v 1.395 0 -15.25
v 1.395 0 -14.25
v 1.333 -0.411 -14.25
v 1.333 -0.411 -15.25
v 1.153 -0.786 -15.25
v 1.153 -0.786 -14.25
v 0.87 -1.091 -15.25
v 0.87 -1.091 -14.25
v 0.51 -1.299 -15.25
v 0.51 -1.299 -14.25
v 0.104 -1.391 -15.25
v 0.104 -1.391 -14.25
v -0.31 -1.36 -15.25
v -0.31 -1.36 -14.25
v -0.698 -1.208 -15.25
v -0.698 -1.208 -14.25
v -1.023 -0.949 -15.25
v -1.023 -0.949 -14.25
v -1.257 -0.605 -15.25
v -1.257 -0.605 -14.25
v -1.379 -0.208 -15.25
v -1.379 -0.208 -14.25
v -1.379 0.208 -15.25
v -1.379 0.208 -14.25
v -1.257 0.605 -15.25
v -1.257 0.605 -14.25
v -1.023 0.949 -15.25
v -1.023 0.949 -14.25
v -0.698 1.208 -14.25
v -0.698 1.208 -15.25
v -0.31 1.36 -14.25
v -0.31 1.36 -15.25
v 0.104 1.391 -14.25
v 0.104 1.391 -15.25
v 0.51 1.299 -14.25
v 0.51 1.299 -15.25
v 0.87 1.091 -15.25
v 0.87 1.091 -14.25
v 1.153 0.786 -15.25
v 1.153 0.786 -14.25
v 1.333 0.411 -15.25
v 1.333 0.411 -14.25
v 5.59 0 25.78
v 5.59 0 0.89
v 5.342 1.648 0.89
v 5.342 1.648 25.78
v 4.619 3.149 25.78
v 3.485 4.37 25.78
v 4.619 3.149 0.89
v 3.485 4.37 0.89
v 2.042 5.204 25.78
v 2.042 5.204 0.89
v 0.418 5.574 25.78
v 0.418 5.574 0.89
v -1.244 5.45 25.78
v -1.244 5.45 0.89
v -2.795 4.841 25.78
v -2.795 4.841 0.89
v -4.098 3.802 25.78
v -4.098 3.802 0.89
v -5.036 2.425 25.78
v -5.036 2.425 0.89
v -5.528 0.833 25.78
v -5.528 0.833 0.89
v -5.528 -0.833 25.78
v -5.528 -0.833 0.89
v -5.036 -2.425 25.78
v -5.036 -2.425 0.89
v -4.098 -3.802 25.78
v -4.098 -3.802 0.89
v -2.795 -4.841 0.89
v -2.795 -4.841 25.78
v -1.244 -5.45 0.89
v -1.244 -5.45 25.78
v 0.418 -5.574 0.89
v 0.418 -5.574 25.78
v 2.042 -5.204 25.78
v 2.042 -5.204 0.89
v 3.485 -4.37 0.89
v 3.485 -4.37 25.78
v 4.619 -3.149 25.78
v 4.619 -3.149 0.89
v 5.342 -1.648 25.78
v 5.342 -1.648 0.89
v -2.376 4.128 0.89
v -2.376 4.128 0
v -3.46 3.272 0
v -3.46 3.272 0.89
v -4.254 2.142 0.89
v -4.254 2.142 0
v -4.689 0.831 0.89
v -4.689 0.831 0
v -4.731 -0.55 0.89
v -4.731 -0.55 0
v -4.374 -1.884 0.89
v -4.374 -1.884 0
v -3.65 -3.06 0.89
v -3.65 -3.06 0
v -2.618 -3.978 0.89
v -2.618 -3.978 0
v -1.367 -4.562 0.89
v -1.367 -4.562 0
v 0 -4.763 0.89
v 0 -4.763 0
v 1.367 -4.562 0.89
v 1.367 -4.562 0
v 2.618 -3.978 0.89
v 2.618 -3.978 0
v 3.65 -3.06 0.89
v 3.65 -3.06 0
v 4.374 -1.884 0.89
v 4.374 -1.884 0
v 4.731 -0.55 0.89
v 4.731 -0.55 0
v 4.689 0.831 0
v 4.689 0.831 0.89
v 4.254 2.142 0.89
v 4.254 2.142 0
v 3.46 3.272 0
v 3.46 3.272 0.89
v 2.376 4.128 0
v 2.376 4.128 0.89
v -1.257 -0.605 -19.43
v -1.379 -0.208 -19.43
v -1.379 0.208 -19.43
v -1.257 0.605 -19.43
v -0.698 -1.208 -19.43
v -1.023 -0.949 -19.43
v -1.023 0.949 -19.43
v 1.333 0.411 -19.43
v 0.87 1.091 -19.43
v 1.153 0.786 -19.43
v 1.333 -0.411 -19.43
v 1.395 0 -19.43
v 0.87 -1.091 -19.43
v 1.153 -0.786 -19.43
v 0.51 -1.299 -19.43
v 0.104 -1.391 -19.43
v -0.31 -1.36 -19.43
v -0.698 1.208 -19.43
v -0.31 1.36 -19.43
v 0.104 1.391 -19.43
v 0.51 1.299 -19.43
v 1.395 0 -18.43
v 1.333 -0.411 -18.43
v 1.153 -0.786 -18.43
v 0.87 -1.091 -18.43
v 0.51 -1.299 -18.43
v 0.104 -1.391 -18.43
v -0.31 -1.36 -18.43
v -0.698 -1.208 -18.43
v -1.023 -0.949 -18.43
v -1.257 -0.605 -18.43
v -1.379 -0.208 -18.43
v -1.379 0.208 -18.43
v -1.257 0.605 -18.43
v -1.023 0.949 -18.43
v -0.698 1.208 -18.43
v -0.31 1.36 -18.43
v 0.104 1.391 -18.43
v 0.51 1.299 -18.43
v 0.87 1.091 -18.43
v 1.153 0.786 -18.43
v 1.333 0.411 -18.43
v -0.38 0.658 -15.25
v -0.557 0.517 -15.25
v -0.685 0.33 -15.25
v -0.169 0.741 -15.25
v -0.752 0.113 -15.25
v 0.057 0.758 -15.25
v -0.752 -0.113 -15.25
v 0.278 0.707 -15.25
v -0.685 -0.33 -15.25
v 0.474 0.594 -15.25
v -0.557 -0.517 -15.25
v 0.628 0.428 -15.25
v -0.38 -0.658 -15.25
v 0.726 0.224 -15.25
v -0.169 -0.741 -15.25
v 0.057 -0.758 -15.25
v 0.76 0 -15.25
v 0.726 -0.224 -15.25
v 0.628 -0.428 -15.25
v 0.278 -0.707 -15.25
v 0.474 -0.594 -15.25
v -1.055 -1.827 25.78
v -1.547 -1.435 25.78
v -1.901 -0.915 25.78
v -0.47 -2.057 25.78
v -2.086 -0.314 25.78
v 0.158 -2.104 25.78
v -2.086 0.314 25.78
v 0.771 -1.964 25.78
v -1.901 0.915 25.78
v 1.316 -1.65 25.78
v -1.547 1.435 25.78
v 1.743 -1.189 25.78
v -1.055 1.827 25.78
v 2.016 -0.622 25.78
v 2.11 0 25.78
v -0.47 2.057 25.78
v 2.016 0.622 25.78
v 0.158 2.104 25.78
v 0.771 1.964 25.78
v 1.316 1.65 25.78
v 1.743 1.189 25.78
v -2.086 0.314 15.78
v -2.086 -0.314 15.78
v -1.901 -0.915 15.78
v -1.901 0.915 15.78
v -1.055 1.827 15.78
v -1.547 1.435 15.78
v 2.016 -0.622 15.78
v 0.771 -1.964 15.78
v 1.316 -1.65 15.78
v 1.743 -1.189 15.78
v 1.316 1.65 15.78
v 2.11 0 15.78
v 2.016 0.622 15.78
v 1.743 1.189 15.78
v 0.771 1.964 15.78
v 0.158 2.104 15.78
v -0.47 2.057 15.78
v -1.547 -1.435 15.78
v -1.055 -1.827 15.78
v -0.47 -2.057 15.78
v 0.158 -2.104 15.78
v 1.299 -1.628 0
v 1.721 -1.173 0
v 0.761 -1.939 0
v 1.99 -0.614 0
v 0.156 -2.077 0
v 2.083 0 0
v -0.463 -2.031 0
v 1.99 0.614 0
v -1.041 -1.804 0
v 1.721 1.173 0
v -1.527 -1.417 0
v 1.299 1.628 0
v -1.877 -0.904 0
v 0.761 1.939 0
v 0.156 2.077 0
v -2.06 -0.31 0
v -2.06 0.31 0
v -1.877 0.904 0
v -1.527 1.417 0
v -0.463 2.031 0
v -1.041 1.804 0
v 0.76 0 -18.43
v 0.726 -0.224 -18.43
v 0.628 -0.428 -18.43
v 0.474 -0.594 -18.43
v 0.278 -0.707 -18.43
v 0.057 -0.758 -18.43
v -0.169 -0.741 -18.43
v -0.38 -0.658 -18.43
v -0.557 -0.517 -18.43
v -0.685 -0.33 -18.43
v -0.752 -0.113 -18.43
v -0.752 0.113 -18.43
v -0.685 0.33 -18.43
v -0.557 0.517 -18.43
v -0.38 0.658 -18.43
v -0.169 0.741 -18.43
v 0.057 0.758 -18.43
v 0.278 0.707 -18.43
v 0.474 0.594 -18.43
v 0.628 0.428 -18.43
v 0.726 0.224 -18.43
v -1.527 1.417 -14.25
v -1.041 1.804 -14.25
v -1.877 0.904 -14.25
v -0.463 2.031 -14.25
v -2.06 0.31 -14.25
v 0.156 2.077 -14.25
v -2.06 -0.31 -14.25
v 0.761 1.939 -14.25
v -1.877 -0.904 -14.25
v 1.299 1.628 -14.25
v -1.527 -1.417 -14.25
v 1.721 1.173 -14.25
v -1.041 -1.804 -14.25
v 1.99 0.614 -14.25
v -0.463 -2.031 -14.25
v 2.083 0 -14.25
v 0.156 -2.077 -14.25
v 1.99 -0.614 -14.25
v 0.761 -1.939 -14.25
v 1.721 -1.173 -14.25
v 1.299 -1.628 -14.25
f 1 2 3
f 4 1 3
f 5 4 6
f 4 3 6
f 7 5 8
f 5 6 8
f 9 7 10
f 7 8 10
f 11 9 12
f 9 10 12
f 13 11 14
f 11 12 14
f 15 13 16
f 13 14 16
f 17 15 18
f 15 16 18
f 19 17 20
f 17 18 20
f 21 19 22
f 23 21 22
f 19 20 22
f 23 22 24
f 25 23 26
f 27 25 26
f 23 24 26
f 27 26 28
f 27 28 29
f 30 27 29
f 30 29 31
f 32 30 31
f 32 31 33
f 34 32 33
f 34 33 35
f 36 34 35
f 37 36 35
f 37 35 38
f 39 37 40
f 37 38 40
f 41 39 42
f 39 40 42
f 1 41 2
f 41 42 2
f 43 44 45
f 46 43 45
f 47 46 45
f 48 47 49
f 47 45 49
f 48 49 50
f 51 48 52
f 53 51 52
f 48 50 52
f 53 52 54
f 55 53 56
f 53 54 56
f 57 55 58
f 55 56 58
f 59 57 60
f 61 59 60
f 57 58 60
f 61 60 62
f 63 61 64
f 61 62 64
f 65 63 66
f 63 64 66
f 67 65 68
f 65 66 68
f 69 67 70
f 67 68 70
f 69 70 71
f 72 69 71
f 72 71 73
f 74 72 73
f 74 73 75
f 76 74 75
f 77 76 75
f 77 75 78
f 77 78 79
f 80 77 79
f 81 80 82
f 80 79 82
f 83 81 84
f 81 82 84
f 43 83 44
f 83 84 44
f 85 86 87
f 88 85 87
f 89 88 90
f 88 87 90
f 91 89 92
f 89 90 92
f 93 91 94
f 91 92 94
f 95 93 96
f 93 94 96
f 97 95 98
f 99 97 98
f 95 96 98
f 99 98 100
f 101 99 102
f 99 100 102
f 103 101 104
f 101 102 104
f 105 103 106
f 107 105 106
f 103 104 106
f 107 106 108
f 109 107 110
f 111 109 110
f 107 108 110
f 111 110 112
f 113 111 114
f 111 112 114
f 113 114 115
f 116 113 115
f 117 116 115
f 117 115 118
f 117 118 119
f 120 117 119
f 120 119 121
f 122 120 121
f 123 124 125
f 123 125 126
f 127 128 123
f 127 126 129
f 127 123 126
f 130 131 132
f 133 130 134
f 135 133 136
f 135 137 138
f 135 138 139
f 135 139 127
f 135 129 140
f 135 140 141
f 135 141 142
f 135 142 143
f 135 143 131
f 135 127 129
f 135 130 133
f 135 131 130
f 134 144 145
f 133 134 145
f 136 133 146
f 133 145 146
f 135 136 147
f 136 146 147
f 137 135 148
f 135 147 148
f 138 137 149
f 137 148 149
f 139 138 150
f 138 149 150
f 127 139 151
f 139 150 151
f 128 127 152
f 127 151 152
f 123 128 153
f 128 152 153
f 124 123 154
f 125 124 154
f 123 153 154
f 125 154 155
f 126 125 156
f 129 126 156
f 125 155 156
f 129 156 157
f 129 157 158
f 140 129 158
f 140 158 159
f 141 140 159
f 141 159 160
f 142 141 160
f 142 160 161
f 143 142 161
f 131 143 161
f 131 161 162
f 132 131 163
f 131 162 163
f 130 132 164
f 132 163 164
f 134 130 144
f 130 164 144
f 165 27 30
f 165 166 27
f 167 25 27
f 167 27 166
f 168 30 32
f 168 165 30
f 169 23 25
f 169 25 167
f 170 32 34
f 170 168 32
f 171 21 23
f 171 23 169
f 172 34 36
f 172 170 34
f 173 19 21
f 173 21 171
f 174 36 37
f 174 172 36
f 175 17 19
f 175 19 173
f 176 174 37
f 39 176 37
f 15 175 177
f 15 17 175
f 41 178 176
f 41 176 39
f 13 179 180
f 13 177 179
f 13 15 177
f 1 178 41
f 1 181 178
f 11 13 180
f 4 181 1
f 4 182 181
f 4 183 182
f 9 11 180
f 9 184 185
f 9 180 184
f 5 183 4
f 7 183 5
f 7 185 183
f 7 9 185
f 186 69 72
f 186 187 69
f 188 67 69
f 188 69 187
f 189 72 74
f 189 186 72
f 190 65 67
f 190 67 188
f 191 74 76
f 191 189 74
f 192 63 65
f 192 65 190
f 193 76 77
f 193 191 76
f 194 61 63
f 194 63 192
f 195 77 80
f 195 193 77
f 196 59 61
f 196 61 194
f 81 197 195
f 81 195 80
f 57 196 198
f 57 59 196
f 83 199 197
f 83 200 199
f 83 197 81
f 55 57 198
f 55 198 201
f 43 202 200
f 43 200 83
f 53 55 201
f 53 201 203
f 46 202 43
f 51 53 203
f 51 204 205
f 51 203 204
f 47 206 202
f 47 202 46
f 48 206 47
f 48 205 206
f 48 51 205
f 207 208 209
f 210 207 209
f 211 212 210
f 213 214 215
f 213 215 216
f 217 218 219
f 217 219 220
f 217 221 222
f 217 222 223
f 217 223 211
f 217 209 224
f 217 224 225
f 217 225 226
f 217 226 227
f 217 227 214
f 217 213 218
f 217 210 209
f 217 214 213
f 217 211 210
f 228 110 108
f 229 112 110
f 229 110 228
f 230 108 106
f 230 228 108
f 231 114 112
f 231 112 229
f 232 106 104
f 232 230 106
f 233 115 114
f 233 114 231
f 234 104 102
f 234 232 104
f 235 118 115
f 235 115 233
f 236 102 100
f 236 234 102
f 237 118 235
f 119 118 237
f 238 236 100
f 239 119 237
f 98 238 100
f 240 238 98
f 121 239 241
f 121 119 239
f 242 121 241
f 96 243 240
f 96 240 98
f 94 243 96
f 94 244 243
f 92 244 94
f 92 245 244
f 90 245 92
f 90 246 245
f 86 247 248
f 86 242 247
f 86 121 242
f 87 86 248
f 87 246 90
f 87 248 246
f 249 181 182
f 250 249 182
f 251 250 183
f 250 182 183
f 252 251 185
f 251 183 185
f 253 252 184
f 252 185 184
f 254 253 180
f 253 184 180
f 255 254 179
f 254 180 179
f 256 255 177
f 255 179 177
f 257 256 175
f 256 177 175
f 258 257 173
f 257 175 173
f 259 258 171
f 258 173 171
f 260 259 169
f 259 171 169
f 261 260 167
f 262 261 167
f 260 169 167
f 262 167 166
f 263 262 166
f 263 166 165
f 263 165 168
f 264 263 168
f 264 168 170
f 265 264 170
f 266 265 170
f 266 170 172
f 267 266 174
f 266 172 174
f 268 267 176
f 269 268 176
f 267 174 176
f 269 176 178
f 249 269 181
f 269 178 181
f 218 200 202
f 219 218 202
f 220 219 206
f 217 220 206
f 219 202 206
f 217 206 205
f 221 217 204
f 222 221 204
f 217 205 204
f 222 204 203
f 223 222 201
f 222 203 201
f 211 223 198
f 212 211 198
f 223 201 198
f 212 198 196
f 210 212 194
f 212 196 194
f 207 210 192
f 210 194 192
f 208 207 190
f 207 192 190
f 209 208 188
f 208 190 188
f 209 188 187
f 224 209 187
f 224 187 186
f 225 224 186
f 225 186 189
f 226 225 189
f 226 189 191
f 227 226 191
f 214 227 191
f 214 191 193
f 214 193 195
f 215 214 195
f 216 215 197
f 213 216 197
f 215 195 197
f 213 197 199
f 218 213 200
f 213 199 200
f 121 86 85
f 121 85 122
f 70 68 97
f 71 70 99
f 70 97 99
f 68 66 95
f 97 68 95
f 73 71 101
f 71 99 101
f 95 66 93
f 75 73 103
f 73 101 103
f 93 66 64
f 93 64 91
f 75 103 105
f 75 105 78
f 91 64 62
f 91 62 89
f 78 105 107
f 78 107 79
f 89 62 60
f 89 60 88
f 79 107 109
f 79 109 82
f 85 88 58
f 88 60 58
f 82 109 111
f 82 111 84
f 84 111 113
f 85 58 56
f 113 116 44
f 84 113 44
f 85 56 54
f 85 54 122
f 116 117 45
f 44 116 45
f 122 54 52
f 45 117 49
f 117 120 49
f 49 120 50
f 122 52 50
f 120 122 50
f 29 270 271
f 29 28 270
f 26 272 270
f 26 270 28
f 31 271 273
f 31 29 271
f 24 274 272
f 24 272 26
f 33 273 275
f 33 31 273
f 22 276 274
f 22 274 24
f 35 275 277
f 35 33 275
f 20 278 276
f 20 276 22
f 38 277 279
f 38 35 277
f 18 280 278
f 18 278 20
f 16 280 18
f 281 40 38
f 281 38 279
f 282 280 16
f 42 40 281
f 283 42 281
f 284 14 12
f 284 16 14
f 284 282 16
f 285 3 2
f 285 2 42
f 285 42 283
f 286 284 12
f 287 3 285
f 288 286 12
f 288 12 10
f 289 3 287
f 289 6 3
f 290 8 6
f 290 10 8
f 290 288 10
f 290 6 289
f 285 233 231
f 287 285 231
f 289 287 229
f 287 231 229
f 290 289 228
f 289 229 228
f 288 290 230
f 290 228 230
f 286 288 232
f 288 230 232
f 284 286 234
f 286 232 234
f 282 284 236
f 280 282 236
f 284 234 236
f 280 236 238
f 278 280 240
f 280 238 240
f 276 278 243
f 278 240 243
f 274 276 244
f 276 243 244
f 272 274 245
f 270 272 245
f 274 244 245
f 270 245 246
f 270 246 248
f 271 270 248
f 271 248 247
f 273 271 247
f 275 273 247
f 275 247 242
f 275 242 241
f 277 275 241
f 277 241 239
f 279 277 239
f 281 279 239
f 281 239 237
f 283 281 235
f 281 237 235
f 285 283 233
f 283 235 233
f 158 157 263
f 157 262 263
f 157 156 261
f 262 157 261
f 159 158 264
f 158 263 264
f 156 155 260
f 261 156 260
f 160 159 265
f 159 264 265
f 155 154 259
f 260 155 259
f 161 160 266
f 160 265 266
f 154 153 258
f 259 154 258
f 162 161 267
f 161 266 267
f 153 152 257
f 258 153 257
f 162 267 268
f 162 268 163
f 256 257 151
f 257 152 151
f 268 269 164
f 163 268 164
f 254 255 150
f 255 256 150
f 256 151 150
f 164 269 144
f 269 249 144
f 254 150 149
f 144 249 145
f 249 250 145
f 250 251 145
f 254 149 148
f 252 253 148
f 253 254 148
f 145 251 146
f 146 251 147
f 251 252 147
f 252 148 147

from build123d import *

# Parameters (mm, degrees)
PAD_DEPTH    = 0.89
SKETCH001_R  = 5.59
PAD001_DEPTH = 24.89
SKETCH002_R  = 2.0828
PAD002_DEPTH = 14.25
SKETCH003_R  = 1.395
PAD003_DEPTH = 1
SKETCH004_R  = 0.76
PAD004_DEPTH = 3.18
SKETCH005_R  = 1.395
PAD005_DEPTH = 1
SKETCH006_R  = 2.11
POCKET_DEPTH = 10


with BuildPart() as part:
    # Sketch → Pad (new body)
    with BuildSketch(Plane.XY):
        with BuildLine():
            Line((-2.375952, 4.1275), (2.375952, 4.1275))
            ThreePointArc((-2.375952, 4.1275), (0, -4.7625), (2.375952, 4.1275))
        make_face()
    extrude(amount=PAD_DEPTH)

    # Sketch001 (on Face4 of Pad) → Pad001 (join)
    with BuildSketch(Plane.XY.offset(0.89)):
        Circle(SKETCH001_R)
    extrude(amount=PAD001_DEPTH)

    # Sketch002 (on Face6 of Pad001) → Pad002 (join)
    with BuildSketch(Plane(origin=(0, 0, 0), x_dir=(1, 0, 0), z_dir=(0, 0, -1))):
        Circle(SKETCH002_R)
    extrude(amount=PAD002_DEPTH)

    # Sketch003 (on Face8 of Pad002) → Pad003 (join)
    with BuildSketch(Plane(origin=(0, 0, -14.25), x_dir=(1, 0, 0), z_dir=(0, 0, -1))):
        Circle(SKETCH003_R)
    extrude(amount=PAD003_DEPTH)

    # Sketch004 (on Face10 of Pad003) → Pad004 (join)
    with BuildSketch(Plane(origin=(0, 0, -15.25), x_dir=(1, 0, 0), z_dir=(0, 0, -1))):
        Circle(SKETCH004_R)
    extrude(amount=PAD004_DEPTH)

    # Sketch005 (on Face12 of Pad004) → Pad005 (join)
    with BuildSketch(Plane(origin=(0, 0, -18.43), x_dir=(1, 0, 0), z_dir=(0, 0, -1))):
        Circle(SKETCH005_R)
    extrude(amount=PAD005_DEPTH)

    # Sketch006 (on Face14 of Pad005) → Pocket (cut)
    with BuildSketch(Plane.XY.offset(25.78)):
        Circle(SKETCH006_R)
    extrude(amount=-POCKET_DEPTH, mode=Mode.SUBTRACT)


solid = part.part
